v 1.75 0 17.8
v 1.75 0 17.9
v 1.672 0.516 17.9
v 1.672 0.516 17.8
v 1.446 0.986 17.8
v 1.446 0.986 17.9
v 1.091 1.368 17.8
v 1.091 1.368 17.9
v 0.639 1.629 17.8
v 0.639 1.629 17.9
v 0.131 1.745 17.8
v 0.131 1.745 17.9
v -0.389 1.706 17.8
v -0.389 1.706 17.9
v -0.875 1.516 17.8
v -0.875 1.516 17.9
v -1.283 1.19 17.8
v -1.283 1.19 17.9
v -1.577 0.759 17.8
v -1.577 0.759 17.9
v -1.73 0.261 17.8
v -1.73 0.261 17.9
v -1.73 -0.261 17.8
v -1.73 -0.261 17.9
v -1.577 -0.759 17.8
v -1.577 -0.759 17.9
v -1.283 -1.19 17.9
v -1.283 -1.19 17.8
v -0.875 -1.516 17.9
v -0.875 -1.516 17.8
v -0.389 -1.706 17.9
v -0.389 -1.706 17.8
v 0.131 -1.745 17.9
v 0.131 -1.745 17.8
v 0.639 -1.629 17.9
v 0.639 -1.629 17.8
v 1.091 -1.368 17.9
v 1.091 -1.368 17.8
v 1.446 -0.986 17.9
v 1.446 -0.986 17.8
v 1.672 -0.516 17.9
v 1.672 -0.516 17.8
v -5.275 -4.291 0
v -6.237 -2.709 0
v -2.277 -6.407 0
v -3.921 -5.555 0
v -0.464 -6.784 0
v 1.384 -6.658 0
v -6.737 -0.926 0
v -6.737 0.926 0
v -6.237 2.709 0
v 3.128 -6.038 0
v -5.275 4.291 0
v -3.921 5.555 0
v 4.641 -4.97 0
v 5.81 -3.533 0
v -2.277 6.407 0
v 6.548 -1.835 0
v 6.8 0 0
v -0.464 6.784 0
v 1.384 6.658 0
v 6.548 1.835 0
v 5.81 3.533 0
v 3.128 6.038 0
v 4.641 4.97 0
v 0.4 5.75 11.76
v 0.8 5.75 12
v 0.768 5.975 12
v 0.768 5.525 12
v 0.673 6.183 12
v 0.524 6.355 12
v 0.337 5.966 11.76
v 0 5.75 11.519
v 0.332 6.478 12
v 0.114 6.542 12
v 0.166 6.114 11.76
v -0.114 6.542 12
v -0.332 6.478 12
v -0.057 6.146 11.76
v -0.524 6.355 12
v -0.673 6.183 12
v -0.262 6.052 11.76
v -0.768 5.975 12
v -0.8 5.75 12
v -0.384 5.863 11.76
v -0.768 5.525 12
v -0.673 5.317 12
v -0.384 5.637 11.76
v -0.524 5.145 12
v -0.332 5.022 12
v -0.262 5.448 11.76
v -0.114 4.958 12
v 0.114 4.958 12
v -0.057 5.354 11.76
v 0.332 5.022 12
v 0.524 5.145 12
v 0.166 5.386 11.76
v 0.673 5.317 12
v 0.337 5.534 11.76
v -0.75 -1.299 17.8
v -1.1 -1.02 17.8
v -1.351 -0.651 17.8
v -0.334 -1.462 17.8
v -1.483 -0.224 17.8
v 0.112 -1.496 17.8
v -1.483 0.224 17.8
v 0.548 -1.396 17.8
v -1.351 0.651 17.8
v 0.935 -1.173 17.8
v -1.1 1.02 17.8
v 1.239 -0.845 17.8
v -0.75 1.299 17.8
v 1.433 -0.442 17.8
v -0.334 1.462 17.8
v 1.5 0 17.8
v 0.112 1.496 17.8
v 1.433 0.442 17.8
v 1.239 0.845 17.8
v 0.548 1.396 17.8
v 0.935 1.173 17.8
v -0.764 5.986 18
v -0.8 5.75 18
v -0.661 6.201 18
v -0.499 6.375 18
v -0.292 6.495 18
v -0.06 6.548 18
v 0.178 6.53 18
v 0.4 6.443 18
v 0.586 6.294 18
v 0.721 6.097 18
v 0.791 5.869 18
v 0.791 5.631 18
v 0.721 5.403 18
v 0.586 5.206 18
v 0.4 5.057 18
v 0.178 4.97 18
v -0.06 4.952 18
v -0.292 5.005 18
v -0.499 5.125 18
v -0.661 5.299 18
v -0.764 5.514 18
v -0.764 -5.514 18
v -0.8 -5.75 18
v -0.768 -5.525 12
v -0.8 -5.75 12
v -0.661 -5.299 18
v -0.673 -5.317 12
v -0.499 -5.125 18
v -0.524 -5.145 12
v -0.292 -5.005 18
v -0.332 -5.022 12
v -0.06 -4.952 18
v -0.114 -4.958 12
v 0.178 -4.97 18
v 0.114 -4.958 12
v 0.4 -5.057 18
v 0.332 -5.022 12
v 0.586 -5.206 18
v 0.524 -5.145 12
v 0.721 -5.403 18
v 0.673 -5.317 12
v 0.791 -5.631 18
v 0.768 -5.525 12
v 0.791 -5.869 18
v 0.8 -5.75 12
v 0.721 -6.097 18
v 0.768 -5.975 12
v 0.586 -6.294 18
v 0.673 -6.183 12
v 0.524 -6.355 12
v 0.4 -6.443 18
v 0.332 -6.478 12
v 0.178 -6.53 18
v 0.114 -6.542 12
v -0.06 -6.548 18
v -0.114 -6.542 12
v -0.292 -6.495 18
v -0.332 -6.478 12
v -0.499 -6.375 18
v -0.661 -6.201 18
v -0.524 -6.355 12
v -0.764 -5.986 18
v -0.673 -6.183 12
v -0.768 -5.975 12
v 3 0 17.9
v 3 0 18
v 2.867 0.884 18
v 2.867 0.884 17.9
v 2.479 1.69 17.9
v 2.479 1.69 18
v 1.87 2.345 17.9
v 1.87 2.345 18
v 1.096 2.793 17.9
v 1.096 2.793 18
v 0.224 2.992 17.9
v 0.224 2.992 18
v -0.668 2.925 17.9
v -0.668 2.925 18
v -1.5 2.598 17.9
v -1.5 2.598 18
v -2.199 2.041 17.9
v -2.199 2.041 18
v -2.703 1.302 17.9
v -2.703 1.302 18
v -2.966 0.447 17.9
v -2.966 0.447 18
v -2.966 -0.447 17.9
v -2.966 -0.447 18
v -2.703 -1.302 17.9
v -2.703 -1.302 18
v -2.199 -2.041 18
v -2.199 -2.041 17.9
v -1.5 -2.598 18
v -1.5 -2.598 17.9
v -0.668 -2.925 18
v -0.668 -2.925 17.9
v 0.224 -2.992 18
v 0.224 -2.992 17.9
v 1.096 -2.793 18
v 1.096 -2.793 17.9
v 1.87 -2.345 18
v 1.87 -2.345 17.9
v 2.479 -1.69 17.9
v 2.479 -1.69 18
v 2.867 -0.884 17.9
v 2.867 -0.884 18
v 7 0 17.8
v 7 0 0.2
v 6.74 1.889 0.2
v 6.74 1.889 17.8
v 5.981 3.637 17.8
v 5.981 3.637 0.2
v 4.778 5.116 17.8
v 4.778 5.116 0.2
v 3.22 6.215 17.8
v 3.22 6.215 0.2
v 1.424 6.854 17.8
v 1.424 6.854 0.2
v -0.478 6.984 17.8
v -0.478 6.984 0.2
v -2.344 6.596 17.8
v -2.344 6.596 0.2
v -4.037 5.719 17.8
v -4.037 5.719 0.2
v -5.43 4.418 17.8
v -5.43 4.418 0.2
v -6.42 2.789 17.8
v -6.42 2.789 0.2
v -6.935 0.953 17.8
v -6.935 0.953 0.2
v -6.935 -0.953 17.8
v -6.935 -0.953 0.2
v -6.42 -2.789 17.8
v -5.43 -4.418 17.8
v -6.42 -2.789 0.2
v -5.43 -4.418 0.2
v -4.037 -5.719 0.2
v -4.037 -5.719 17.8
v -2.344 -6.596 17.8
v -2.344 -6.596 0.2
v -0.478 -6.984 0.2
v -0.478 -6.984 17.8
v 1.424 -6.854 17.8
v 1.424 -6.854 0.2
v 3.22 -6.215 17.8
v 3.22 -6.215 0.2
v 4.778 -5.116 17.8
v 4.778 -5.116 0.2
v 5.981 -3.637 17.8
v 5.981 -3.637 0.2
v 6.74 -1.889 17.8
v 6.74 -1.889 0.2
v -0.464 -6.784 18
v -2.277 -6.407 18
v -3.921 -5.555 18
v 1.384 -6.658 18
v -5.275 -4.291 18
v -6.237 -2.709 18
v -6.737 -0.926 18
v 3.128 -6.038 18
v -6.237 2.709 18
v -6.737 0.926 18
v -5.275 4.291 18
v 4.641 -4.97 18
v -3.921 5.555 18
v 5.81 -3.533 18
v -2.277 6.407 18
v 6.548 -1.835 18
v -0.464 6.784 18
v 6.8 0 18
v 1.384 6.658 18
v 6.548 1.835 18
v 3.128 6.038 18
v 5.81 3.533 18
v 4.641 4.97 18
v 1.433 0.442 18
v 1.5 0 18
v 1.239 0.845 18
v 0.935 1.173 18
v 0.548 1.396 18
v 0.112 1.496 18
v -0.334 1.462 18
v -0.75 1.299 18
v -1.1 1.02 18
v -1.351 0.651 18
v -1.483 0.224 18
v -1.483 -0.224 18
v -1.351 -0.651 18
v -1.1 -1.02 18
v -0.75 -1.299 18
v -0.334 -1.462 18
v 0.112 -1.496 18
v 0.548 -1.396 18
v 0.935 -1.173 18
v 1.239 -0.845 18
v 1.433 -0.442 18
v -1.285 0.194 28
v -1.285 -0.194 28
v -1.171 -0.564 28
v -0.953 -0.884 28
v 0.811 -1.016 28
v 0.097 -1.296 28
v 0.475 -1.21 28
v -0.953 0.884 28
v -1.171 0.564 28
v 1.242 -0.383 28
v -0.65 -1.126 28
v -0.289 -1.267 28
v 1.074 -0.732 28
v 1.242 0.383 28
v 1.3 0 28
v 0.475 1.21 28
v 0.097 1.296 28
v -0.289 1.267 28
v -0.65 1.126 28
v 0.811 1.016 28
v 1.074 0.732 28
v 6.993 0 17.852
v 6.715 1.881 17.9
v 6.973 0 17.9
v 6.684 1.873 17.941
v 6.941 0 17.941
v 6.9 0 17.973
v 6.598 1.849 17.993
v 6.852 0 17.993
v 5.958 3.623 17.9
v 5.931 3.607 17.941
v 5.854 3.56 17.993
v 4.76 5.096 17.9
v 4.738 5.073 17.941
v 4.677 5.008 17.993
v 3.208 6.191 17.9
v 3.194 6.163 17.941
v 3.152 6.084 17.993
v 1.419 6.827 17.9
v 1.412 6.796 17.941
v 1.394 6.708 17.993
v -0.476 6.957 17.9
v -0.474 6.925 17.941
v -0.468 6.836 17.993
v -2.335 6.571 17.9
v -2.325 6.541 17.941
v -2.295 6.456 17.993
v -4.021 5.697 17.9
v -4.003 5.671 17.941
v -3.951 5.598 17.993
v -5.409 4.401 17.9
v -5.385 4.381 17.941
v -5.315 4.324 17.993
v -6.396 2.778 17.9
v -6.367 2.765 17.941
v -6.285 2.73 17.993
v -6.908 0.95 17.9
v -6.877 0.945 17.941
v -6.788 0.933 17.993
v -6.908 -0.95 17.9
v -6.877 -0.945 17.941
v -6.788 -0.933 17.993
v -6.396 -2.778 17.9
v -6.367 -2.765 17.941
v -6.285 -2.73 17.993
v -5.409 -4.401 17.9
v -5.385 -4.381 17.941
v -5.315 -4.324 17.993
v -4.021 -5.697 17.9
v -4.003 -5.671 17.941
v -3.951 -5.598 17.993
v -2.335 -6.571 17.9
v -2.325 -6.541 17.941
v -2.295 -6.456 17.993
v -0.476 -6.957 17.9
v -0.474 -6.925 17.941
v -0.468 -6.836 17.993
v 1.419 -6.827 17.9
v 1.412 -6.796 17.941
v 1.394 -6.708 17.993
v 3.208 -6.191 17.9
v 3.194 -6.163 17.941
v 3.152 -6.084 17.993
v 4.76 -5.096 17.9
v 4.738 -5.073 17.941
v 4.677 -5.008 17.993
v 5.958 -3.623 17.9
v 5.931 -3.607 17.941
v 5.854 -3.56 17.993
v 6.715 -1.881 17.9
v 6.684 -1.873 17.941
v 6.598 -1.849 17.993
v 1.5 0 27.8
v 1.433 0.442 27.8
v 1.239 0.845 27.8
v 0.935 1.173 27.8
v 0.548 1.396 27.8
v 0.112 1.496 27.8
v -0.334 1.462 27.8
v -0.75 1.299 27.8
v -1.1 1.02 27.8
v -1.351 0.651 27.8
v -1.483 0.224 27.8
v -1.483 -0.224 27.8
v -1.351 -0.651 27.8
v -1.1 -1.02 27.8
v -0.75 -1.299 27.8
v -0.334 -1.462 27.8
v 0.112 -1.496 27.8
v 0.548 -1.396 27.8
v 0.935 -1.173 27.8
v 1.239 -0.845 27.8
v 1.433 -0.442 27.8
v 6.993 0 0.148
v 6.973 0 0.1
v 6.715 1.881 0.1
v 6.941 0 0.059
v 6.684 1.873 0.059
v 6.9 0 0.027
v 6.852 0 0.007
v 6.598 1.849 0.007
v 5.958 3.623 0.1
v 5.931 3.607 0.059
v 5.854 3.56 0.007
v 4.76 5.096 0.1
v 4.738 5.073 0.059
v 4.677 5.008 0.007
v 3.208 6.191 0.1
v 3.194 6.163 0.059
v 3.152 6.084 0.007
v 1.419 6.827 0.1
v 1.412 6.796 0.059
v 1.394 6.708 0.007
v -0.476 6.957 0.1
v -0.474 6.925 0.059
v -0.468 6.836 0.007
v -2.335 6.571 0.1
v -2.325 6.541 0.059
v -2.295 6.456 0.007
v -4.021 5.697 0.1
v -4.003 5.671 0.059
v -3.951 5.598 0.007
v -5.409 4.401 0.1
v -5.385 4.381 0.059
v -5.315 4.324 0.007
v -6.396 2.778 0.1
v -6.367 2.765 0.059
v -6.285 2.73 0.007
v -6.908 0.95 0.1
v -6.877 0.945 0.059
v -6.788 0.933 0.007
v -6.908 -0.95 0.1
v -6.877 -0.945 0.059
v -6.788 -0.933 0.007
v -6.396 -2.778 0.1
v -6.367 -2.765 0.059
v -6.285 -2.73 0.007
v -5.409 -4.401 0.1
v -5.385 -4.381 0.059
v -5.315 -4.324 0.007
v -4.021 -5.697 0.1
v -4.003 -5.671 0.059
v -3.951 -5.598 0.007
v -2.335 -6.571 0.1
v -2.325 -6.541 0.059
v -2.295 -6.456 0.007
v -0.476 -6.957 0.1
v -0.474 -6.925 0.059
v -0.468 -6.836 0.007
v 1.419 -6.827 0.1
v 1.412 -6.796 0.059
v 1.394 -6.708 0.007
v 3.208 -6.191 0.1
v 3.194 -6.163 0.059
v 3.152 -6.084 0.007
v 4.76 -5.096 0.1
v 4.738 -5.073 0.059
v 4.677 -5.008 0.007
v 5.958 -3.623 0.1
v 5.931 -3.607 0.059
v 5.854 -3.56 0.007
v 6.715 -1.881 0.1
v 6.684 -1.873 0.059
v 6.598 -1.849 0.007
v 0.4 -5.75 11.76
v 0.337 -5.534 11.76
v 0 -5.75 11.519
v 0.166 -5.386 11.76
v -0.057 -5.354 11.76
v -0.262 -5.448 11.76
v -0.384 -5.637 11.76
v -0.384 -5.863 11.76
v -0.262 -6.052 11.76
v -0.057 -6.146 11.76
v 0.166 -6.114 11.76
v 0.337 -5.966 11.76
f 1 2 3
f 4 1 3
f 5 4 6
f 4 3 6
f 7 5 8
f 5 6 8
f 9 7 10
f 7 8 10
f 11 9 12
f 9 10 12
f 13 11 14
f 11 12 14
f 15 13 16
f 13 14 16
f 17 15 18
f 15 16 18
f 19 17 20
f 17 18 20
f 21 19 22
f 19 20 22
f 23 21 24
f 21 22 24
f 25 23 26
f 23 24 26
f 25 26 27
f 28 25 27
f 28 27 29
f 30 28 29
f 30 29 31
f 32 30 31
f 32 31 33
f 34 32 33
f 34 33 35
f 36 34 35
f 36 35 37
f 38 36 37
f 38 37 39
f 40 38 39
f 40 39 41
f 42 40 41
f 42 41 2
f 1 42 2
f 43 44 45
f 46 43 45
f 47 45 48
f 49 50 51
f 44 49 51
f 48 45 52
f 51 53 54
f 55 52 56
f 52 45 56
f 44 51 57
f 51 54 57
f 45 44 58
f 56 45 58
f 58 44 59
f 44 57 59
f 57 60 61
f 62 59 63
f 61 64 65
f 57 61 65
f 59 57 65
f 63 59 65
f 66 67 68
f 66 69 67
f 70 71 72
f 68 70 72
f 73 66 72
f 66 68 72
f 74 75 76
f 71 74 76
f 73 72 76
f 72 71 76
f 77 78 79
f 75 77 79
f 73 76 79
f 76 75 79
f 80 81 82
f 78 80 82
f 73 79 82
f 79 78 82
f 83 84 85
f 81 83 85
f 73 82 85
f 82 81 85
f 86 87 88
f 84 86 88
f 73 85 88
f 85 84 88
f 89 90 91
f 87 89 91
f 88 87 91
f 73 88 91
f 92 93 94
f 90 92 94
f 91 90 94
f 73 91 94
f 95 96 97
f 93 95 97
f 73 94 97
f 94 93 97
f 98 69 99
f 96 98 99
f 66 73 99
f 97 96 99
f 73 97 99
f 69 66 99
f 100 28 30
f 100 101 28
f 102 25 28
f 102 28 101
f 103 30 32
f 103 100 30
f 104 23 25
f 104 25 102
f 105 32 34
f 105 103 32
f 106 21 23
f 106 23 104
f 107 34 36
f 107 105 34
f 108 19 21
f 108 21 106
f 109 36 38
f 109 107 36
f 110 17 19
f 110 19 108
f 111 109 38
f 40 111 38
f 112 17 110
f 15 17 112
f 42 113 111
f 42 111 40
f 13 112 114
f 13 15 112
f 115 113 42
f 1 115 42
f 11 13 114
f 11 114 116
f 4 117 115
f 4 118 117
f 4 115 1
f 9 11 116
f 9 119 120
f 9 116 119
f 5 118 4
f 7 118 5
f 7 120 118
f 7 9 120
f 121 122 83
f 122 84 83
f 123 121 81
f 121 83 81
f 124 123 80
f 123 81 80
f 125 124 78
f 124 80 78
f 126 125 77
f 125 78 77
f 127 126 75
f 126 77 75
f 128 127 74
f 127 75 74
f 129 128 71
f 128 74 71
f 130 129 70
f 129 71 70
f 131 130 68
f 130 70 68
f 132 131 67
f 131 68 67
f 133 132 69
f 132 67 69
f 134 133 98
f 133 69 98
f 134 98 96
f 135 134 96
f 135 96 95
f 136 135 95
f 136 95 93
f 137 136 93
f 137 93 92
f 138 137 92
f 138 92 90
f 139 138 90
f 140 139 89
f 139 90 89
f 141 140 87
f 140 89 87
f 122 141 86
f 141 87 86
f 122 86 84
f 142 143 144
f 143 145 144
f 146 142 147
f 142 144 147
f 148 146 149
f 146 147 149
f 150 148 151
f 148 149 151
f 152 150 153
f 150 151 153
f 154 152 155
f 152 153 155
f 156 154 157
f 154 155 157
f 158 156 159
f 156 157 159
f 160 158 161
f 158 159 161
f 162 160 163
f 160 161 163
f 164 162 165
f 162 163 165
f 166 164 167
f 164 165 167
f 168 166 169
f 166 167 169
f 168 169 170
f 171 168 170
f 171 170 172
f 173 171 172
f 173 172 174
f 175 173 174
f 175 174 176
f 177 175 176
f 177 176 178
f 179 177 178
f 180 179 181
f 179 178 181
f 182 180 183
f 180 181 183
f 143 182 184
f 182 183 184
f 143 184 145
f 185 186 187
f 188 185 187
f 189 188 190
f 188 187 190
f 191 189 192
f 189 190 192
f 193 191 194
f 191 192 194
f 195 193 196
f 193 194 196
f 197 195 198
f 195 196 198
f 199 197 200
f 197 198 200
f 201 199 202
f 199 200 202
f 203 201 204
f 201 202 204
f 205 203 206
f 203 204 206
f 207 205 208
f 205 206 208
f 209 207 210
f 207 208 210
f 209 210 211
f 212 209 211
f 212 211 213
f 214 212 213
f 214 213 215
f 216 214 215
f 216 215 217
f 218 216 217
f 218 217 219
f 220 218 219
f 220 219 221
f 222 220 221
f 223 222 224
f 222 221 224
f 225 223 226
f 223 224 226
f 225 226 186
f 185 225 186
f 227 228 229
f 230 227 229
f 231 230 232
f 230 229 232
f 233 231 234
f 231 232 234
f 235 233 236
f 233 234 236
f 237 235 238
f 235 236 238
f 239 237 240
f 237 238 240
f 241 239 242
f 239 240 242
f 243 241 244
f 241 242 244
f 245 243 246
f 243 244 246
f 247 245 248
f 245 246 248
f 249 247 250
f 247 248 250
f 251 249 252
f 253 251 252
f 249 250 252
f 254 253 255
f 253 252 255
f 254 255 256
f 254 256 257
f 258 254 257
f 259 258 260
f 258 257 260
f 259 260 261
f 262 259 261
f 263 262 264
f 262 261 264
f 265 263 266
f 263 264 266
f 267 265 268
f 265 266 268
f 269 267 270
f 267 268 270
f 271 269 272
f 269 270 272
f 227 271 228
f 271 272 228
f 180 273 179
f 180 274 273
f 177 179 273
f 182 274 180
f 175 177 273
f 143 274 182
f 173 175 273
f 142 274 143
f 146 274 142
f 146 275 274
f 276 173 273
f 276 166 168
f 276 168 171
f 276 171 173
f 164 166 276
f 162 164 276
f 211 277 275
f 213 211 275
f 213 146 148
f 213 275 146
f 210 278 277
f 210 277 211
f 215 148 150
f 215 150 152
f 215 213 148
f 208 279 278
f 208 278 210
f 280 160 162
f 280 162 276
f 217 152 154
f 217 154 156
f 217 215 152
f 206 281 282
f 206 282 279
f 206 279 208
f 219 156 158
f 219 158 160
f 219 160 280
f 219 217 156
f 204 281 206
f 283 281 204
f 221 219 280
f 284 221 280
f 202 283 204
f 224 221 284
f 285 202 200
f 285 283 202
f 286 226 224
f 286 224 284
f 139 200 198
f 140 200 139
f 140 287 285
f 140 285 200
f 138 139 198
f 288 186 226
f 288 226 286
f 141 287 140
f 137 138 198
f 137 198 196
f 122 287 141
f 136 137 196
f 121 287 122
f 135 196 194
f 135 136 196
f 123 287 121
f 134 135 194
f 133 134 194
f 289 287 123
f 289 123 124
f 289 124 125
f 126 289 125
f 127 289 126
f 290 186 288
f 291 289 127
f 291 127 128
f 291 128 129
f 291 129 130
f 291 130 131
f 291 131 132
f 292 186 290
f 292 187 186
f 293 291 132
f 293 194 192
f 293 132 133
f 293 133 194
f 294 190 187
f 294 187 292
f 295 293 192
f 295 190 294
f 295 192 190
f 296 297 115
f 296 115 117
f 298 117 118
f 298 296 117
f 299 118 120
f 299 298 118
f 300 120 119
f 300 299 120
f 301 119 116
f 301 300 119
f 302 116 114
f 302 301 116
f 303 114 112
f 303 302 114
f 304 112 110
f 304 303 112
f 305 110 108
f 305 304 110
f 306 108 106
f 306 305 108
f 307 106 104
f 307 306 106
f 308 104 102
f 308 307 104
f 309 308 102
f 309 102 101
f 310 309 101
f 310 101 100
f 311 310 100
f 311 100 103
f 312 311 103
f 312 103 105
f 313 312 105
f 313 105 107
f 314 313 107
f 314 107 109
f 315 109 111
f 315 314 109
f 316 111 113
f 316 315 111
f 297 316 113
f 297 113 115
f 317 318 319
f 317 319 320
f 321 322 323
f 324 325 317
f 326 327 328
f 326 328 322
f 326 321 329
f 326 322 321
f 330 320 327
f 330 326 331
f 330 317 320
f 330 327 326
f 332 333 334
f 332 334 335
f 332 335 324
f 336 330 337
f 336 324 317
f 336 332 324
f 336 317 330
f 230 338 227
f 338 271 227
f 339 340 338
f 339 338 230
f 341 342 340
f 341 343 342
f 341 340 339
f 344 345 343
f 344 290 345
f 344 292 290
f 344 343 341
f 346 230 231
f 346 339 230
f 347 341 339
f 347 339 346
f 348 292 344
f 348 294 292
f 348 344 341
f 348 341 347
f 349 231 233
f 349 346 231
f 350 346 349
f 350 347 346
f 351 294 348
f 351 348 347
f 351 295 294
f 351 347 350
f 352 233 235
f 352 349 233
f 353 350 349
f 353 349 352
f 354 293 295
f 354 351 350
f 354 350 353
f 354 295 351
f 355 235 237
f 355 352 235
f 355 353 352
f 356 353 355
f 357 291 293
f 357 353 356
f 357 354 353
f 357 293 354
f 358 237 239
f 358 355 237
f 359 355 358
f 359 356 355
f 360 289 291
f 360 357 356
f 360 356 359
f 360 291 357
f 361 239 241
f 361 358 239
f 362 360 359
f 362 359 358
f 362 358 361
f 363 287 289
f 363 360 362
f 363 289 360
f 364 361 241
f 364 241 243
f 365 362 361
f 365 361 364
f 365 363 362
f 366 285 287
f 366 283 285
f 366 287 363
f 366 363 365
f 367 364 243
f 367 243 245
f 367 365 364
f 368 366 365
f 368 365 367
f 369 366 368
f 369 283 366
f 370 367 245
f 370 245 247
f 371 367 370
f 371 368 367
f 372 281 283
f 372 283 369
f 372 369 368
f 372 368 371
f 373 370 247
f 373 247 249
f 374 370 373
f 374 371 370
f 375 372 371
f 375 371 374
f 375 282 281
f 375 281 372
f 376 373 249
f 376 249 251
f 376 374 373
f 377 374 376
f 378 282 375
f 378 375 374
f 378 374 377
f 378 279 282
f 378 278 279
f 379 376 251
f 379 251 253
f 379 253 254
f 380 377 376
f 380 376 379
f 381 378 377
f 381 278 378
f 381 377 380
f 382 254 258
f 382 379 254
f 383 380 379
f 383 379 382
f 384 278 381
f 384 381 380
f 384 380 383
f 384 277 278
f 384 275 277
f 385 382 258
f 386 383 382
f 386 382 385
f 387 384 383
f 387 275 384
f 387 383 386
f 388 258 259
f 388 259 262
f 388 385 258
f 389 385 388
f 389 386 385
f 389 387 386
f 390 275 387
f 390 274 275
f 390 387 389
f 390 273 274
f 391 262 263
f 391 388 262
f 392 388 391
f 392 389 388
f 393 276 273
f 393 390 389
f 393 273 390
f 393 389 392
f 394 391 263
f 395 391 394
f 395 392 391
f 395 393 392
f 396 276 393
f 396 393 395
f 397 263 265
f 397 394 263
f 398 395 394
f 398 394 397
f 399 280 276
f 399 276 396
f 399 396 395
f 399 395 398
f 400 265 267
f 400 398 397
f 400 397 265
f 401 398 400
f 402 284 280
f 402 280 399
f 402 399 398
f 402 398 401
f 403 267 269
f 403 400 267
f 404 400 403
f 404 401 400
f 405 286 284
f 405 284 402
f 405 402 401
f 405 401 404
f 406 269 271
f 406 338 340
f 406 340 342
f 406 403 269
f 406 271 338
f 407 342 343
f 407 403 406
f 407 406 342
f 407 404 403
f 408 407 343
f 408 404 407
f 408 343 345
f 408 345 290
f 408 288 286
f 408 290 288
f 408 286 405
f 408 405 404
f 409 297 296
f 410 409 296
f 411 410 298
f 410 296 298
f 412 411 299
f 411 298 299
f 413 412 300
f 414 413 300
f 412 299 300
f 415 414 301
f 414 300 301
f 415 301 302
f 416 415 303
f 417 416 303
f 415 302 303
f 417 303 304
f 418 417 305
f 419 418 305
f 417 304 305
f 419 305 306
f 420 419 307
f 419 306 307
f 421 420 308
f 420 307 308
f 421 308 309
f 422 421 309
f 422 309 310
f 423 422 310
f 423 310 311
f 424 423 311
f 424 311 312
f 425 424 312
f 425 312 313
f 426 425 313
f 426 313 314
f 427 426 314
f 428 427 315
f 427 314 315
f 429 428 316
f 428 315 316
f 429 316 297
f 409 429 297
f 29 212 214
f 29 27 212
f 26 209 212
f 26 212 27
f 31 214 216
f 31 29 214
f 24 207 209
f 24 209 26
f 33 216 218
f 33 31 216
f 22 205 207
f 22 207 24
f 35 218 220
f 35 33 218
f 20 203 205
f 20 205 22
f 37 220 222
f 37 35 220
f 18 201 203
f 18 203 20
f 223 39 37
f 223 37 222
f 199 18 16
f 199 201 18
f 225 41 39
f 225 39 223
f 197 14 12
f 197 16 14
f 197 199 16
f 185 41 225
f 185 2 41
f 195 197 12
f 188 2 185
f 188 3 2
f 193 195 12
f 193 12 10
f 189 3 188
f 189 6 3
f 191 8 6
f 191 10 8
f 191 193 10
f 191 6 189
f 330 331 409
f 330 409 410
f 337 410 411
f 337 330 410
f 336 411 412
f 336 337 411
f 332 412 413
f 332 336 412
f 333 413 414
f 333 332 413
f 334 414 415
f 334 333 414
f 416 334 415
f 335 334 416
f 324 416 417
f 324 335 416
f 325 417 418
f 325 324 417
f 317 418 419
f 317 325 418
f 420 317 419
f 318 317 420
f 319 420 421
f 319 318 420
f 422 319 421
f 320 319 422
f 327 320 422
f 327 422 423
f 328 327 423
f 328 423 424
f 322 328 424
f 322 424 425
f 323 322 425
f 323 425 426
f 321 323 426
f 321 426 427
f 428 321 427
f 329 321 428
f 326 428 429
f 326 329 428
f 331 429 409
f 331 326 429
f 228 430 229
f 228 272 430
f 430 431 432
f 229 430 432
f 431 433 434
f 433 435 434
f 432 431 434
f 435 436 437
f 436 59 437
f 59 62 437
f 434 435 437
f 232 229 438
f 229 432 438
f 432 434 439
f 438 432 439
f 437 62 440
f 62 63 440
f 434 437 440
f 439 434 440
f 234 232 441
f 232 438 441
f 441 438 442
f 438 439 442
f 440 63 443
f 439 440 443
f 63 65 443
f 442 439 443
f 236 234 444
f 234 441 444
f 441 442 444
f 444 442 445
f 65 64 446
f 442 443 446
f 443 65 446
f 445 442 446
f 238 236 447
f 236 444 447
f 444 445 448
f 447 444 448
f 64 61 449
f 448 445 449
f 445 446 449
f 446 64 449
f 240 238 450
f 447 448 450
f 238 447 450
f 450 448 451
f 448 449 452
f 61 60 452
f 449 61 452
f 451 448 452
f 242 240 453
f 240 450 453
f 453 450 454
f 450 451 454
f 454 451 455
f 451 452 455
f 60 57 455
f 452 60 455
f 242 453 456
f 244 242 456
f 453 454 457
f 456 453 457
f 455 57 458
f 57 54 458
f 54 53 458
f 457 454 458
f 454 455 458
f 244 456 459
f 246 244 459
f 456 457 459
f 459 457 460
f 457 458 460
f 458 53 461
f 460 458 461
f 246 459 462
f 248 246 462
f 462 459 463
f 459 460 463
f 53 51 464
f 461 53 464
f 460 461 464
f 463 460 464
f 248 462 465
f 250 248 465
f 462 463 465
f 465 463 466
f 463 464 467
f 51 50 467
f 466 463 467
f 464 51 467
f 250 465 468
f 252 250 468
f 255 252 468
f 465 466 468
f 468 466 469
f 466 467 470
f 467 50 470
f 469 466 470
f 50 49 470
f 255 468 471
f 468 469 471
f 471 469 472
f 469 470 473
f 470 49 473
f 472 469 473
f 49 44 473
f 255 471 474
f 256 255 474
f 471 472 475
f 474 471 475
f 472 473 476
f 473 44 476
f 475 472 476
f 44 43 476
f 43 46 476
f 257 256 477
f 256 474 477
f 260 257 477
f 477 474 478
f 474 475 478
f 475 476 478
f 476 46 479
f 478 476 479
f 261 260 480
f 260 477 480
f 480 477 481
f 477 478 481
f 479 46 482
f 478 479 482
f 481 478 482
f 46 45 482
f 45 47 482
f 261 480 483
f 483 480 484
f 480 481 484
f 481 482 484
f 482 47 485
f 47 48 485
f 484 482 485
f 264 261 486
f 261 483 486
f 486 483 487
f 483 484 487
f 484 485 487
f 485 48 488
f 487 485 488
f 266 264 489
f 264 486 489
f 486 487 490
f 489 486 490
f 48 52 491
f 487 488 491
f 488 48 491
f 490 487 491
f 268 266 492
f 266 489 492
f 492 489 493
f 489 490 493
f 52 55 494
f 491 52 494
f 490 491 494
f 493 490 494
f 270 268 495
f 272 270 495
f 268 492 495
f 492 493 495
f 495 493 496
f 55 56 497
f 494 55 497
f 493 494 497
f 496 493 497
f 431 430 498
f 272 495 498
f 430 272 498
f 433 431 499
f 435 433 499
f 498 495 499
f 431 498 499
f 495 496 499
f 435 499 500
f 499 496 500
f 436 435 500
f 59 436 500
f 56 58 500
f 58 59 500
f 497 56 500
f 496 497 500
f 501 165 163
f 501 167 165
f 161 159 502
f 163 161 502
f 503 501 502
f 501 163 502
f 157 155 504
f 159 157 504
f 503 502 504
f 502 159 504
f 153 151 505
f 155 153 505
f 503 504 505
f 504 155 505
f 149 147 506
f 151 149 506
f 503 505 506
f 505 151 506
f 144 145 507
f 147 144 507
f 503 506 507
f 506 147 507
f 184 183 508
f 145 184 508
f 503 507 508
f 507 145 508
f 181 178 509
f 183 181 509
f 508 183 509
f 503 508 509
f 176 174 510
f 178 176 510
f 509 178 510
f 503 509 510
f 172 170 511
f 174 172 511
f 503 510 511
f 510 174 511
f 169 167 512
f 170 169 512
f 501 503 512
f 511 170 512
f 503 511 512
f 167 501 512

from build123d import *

# Parameters (mm, degrees)
SKETCH_1_R             = 7
EXTRUDE_1_DEPTH        = 18
FILLET_1_R             = 0.2
SKETCH_2_R             = 1.5
EXTRUDE_2_DEPTH        = 10
CHAMFER_1_SIZE         = 0.2
HOLE_WIZARD_M2_1_D     = 1.6
HOLE_WIZARD_M2_1_DEPTH = 6
HOLE_WIZARD_M2_1_TIP   = 0.480688495
SKETCH_6_R             = 1.75
SKETCH_6_R_2           = 1.5
CUT_EXTRUDE_1_DEPTH    = 0.2
SKETCH_7_R             = 3
SKETCH_7_R_2           = 1.75
CUT_EXTRUDE_2_DEPTH    = 0.1


with BuildPart() as part:
    # 草图1 → 凸台-拉伸1 (new body)
    with BuildSketch(Plane.XY):
        Circle(SKETCH_1_R)
    extrude(amount=EXTRUDE_1_DEPTH)

    # 圆角1
    fillet_1_edges = [part.edges().sort_by_distance(p)[0] for p in [
        (-7, 0, 0),
        (-7, 0, 18),
    ]]
    fillet(fillet_1_edges, radius=FILLET_1_R)

    # 草图2 → 凸台-拉伸2 (add)
    with BuildSketch(Plane.XY.offset(18)):
        Circle(SKETCH_2_R)
    extrude(amount=EXTRUDE_2_DEPTH)

    # 倒角1
    chamfer_1_edges = [part.edges().sort_by_distance(p)[0] for p in [
        (-1.5, 0, 28),
    ]]
    chamfer(chamfer_1_edges, length=CHAMFER_1_SIZE)

    # M2 螺纹孔1
    with Locations(Plane(origin=(0, 5.75, 18), x_dir=(1, 0, 0), z_dir=(0, 0, 1))):
        with Locations((0, 0), (0, -11.5)):
            Hole(HOLE_WIZARD_M2_1_D / 2, depth=HOLE_WIZARD_M2_1_DEPTH)
            with Locations((0, 0, -(HOLE_WIZARD_M2_1_DEPTH + HOLE_WIZARD_M2_1_TIP / 2))):  # 118° drill point
                Cone(0, HOLE_WIZARD_M2_1_D / 2, HOLE_WIZARD_M2_1_TIP, mode=Mode.SUBTRACT)

    # 草图6 → 切除-拉伸1 (cut)
    with BuildSketch(Plane.XY.offset(18)):
        Circle(SKETCH_6_R)
        Circle(SKETCH_6_R_2, mode=Mode.SUBTRACT)
    extrude(amount=-CUT_EXTRUDE_1_DEPTH, mode=Mode.SUBTRACT)

    # 草图7 → 切除-拉伸2 (cut)
    with BuildSketch(Plane.XY.offset(18)):
        Circle(SKETCH_7_R)
        Circle(SKETCH_7_R_2, mode=Mode.SUBTRACT)
    extrude(amount=-CUT_EXTRUDE_2_DEPTH, mode=Mode.SUBTRACT)


solid = part.part
